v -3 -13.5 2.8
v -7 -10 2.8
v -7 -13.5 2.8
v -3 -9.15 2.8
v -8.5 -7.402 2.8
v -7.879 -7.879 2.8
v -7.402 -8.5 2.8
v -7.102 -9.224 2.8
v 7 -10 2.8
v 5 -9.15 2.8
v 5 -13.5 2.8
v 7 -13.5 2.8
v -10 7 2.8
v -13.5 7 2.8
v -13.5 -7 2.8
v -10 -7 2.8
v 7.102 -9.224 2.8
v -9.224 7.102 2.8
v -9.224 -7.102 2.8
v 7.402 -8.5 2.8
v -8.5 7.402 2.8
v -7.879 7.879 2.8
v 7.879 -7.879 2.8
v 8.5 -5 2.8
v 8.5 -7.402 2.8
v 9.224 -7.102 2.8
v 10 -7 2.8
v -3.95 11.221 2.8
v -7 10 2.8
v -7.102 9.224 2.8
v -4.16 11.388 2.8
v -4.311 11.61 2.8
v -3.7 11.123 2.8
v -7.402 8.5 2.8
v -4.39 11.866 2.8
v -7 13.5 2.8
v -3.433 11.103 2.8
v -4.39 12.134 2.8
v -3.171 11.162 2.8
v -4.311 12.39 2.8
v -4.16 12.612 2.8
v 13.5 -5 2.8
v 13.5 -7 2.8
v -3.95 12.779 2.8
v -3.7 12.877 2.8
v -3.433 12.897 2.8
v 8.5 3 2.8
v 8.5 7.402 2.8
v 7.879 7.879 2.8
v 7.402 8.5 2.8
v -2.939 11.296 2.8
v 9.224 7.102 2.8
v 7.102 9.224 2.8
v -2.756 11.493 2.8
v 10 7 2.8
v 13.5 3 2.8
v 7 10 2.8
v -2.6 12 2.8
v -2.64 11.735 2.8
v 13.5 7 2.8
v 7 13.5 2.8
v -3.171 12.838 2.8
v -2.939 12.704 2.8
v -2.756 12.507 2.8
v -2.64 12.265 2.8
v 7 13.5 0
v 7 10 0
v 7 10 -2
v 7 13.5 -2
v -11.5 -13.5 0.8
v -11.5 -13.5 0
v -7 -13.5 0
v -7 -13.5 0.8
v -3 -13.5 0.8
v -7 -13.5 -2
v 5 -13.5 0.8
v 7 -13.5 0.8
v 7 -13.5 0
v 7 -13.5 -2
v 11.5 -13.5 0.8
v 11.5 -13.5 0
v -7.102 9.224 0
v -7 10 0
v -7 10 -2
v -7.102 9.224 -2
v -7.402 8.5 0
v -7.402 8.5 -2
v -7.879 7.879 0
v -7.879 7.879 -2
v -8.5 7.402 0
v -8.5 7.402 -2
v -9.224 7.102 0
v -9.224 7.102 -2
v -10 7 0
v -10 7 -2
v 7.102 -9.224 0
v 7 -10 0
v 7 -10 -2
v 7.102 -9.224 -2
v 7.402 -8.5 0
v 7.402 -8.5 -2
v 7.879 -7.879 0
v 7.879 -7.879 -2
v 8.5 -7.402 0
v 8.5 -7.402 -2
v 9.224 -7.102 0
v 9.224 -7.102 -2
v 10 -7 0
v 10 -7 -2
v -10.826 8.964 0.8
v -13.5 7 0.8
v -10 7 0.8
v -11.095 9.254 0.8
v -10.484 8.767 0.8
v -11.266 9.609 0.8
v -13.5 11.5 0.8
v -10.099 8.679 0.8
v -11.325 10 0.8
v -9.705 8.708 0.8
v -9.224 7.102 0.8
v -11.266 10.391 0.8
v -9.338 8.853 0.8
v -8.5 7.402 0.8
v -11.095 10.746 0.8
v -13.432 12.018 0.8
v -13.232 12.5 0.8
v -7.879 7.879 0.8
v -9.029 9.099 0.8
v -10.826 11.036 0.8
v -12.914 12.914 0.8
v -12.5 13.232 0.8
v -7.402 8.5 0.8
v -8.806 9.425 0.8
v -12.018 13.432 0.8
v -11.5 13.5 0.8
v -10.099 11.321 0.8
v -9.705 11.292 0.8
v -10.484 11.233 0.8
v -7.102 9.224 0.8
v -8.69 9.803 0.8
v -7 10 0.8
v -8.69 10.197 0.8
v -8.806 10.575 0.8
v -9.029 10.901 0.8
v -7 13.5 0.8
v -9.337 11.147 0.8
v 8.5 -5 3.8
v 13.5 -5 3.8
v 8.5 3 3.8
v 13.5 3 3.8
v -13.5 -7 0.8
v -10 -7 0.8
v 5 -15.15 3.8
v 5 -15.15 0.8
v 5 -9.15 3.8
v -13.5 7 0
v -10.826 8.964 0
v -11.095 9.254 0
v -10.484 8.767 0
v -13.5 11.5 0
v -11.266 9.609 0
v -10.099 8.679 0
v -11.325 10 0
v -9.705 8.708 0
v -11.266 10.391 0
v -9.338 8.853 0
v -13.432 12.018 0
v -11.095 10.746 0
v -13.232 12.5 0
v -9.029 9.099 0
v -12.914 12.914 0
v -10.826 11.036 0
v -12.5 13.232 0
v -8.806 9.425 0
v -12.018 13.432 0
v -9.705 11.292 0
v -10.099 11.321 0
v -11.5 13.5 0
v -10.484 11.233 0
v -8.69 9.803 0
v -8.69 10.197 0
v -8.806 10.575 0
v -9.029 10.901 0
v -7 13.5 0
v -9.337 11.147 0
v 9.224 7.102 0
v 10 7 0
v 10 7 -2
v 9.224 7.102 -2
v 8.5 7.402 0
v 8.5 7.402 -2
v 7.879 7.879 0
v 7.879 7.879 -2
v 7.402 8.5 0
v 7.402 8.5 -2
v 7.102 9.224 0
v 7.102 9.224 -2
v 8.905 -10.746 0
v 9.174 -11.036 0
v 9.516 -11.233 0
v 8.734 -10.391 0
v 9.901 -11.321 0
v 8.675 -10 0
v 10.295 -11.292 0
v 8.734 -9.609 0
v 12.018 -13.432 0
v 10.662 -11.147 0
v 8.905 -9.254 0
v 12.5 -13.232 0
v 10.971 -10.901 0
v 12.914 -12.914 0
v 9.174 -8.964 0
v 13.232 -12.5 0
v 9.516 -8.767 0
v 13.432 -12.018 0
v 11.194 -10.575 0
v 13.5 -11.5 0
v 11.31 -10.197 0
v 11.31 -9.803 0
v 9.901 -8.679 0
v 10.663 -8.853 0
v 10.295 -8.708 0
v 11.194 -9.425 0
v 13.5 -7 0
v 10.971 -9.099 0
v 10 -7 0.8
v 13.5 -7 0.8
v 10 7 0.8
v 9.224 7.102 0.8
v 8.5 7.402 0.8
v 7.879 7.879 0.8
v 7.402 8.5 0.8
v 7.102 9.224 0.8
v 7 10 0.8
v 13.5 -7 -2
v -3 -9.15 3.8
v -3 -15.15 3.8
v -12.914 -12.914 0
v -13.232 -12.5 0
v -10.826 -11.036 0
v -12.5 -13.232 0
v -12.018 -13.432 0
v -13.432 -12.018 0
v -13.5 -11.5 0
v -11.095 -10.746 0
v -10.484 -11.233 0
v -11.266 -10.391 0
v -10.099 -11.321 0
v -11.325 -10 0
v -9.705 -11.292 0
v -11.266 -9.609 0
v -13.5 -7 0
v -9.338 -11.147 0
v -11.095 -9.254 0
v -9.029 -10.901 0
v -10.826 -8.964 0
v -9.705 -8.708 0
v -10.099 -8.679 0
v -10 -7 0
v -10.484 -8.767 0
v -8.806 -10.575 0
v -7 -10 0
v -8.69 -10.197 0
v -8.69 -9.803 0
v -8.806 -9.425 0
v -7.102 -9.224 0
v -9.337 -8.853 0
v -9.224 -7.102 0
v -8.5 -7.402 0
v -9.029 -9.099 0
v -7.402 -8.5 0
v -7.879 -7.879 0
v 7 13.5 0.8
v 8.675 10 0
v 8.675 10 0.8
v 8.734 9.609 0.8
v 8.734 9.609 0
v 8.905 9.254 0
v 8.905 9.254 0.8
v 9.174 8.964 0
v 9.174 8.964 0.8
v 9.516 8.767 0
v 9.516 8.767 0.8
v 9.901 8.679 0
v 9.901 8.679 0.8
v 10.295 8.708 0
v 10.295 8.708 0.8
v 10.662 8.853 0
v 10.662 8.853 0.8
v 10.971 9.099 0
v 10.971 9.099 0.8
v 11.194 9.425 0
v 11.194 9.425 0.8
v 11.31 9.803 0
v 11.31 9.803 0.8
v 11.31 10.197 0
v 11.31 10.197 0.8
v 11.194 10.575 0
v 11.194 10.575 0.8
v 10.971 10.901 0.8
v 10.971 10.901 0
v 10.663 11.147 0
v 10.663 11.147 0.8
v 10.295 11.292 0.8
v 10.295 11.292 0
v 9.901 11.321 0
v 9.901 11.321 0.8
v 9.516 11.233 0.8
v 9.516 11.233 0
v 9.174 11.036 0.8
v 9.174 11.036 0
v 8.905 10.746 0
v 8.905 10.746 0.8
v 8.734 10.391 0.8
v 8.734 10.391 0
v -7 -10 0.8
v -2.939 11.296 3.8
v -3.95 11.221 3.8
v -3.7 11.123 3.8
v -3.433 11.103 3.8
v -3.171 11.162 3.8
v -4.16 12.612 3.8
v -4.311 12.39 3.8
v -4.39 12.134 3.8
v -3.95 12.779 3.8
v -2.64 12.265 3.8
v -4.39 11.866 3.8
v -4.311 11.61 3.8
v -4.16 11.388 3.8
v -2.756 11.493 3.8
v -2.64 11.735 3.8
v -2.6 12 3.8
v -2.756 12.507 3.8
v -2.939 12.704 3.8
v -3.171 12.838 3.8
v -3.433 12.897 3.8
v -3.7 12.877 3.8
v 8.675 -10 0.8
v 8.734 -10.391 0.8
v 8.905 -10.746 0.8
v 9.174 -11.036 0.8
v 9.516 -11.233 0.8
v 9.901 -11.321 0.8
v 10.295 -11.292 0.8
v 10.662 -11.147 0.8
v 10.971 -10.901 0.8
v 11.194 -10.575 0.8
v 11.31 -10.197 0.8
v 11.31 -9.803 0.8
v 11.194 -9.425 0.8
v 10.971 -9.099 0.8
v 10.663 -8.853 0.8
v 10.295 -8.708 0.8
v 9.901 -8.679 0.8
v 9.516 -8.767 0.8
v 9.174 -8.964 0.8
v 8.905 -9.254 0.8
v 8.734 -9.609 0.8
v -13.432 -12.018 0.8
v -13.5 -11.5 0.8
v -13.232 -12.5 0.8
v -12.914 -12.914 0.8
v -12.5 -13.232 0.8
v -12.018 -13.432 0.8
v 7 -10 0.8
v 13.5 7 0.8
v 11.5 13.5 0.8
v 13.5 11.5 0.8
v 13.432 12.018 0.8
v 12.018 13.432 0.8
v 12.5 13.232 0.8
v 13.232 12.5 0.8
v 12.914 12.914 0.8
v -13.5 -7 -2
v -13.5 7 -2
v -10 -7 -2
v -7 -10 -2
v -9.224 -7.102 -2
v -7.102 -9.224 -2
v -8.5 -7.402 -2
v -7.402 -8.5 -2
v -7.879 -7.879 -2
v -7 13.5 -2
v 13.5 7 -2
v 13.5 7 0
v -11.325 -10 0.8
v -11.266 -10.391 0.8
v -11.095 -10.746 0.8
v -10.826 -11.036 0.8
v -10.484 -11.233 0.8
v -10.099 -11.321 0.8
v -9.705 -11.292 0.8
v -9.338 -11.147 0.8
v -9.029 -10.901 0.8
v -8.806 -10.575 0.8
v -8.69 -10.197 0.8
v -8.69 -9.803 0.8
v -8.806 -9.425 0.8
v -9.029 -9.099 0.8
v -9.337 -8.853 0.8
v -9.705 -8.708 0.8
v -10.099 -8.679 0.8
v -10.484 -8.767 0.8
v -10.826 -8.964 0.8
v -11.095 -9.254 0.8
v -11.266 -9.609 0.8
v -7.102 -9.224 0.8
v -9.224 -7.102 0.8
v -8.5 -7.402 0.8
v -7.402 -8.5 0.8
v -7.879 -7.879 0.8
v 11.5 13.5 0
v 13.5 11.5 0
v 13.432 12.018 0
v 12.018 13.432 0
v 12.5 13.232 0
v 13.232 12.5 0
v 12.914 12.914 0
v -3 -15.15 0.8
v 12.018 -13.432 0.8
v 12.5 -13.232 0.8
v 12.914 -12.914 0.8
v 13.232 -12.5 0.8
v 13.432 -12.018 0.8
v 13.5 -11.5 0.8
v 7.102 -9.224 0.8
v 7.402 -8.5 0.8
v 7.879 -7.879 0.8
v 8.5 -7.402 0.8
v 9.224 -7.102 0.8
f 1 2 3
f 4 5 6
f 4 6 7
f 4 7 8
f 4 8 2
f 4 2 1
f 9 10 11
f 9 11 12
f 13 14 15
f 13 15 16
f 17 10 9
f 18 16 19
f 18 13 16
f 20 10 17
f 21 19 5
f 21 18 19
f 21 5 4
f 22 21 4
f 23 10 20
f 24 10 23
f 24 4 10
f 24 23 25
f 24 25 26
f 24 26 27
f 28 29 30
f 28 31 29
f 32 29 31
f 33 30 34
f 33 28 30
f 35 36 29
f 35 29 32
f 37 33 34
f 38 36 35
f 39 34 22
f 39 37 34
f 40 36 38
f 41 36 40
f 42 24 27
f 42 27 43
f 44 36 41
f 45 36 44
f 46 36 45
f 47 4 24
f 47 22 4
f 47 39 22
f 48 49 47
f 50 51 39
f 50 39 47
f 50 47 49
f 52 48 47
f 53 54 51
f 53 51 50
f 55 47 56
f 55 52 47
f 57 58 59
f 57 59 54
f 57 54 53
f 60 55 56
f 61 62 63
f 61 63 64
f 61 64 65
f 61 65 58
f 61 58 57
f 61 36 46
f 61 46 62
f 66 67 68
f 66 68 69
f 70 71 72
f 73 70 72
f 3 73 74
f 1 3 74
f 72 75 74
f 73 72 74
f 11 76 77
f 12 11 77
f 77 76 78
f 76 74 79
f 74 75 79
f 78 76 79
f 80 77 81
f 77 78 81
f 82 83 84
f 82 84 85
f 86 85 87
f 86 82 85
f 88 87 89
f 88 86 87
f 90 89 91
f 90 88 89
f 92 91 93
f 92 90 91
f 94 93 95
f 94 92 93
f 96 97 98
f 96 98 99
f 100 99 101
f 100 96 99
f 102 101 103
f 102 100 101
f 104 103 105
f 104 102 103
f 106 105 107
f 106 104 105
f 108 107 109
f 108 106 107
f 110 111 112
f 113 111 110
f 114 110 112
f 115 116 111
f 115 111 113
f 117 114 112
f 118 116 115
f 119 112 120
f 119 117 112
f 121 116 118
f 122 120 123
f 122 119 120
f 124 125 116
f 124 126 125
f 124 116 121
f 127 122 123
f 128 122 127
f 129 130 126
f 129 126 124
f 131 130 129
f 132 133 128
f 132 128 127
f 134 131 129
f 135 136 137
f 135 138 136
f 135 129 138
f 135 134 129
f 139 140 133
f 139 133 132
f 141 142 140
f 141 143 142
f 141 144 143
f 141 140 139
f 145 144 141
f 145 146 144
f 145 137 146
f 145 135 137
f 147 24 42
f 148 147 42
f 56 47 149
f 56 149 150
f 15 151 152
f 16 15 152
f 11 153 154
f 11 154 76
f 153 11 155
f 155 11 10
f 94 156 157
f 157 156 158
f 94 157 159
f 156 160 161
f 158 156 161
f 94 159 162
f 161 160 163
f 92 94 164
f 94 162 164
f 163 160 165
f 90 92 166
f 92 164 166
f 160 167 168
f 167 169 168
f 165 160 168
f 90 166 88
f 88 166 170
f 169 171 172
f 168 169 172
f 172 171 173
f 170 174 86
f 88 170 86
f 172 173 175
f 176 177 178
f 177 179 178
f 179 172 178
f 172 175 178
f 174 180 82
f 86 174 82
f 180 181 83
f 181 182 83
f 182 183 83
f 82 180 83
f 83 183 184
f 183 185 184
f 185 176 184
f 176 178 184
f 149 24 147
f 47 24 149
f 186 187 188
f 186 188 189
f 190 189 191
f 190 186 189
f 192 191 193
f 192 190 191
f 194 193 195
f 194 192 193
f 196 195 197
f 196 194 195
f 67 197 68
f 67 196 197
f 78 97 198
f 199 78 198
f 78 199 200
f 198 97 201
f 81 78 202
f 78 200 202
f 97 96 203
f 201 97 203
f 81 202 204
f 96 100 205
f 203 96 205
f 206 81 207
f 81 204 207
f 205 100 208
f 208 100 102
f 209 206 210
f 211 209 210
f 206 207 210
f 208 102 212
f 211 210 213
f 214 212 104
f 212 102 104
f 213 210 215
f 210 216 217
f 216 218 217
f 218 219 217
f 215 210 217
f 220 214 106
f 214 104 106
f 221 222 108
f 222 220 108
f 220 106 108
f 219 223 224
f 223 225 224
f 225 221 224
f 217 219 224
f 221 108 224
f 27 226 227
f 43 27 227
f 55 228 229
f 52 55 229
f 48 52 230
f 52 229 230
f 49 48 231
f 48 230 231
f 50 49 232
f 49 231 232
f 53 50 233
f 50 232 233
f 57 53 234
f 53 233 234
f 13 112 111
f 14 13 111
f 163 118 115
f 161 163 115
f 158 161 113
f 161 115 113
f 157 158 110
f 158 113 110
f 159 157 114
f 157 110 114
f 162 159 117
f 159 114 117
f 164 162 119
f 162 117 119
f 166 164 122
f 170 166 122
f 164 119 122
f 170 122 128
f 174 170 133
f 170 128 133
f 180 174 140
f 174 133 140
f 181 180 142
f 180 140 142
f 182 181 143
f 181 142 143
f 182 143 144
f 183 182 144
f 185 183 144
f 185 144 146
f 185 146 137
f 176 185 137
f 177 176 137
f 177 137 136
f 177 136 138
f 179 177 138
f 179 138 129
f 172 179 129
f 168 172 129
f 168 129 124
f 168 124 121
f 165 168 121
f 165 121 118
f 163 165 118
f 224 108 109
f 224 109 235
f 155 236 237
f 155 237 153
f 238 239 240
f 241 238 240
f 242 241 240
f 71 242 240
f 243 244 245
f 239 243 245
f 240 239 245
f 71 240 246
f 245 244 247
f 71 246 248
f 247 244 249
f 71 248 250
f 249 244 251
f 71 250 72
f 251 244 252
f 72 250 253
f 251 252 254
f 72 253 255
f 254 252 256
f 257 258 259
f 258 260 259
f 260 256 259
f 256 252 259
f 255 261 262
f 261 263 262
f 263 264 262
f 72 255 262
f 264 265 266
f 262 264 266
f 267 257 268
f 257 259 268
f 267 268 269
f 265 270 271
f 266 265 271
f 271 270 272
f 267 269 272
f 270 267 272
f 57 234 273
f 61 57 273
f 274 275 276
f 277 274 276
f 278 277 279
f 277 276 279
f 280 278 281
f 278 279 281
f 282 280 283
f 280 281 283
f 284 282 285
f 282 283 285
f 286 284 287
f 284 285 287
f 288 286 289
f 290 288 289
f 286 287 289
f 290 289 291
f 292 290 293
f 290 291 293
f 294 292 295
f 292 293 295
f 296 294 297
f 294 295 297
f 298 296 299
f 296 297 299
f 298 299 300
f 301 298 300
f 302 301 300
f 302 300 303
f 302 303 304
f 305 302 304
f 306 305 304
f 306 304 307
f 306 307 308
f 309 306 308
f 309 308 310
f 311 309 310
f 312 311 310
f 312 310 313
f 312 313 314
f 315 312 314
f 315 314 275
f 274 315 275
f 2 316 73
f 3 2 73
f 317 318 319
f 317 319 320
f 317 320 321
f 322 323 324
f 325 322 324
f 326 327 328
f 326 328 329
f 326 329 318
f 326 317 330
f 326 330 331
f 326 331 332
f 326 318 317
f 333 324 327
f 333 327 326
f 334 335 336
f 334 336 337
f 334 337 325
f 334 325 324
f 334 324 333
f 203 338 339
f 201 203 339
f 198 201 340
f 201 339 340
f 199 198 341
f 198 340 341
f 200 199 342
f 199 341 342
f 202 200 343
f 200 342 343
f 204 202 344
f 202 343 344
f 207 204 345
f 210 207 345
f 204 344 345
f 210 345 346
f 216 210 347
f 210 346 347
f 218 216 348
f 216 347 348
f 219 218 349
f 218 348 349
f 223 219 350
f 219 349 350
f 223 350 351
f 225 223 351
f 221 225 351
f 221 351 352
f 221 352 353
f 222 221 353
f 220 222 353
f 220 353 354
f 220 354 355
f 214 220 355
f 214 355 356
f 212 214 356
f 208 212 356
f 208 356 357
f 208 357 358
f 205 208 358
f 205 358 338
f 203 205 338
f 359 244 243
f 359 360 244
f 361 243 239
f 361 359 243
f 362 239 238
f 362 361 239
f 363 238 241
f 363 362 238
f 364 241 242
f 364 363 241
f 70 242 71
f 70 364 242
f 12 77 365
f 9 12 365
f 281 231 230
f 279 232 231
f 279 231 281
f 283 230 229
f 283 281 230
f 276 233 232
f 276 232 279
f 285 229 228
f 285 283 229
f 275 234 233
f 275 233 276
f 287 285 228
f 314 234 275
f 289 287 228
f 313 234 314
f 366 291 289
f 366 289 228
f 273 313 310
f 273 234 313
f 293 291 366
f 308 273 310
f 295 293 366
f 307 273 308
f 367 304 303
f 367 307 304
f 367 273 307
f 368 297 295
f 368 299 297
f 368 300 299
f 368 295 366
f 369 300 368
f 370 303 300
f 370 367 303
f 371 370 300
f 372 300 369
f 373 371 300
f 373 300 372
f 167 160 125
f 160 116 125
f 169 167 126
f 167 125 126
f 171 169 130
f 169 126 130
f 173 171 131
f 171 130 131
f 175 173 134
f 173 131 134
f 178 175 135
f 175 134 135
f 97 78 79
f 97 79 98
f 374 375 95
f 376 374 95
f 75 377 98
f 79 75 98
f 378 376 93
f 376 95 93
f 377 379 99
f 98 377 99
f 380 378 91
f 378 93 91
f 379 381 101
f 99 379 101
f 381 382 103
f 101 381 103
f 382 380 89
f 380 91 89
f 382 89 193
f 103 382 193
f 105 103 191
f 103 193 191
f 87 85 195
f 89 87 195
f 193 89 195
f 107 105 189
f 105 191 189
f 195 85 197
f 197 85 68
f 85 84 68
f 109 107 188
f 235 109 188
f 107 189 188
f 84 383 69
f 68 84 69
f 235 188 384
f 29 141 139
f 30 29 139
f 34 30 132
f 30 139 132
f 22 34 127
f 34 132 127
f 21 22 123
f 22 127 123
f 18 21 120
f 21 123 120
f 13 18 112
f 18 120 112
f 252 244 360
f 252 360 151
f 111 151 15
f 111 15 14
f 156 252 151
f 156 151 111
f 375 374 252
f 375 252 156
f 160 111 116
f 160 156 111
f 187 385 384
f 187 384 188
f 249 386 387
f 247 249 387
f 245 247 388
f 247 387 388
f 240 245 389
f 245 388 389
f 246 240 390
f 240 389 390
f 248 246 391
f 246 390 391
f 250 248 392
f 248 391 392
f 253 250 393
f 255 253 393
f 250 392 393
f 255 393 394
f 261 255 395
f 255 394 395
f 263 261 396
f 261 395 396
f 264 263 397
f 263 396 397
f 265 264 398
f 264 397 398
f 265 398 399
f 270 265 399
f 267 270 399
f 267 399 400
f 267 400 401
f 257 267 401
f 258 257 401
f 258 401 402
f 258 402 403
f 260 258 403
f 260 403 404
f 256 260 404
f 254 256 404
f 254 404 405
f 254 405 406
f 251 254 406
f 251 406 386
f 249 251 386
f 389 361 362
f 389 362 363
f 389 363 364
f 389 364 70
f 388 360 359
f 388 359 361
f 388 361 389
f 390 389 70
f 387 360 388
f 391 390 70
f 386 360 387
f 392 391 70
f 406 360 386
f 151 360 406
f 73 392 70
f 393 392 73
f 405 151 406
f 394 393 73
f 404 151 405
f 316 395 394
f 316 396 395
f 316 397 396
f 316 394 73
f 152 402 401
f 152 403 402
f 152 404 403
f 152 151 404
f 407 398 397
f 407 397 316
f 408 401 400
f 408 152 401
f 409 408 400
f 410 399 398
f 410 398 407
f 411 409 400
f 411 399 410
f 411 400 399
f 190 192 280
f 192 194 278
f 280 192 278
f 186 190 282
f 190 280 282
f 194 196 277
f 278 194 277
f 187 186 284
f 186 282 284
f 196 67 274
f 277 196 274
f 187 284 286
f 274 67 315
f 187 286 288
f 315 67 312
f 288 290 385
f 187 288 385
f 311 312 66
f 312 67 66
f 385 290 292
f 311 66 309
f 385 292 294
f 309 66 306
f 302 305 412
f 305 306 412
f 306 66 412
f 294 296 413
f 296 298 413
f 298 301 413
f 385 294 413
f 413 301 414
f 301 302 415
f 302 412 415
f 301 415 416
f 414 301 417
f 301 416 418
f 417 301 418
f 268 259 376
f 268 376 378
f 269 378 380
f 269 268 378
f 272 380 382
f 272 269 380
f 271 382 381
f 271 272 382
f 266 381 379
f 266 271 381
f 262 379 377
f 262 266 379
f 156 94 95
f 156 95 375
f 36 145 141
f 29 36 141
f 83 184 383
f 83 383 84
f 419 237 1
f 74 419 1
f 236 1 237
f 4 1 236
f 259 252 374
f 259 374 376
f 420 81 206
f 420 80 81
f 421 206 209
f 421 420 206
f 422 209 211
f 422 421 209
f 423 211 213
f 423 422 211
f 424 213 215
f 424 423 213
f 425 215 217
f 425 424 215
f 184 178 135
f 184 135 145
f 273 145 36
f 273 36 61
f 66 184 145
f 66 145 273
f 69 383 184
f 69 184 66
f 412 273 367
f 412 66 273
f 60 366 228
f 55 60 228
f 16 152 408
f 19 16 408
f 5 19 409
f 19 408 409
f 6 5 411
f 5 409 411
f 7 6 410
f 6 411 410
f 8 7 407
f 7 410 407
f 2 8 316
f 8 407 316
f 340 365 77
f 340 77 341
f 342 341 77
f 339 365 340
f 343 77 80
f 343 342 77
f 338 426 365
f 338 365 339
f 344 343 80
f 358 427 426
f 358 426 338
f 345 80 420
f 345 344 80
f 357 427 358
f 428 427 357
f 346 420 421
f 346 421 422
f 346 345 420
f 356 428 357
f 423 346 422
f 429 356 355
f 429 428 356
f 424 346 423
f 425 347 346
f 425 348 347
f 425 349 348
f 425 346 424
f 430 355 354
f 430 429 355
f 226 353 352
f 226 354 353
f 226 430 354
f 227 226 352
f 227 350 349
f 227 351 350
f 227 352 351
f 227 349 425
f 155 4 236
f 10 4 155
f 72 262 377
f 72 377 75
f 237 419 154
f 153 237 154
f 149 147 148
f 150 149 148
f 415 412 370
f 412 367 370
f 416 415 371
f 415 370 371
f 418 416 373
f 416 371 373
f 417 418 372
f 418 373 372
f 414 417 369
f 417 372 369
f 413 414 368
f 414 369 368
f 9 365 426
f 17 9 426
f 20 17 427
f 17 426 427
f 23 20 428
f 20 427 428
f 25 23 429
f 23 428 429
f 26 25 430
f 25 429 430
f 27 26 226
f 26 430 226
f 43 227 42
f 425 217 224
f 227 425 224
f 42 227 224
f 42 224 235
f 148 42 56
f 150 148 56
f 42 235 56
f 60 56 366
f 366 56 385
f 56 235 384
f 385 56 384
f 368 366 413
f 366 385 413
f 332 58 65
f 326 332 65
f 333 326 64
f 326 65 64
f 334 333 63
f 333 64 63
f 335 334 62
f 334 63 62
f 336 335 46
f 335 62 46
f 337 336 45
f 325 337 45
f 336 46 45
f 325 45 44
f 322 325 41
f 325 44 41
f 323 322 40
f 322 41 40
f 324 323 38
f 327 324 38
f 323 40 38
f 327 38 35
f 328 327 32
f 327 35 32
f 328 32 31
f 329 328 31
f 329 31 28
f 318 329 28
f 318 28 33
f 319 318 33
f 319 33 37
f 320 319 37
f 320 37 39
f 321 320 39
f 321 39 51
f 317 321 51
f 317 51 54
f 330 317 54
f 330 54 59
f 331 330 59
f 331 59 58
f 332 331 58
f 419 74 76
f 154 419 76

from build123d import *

# Parameters (mm, degrees)
F0_W          = 27
F0_H          = 27
F1_DEPTH      = 0.8
F2_D          = 2.65
F3_R          = 2
F4_W          = 5
F4_H          = 8
F4_W_2        = 8
F4_H_2        = 6
F4_R          = 0.9
F5_DEPTH      = 3
F7_DEPTH      = 2.8
F7_DEPTH_BACK = 2


with BuildPart() as f1:
    # F0 (on Top) → F1 (new body)
    with BuildSketch(Plane.XY):
        Rectangle(F0_W, F0_H)
    extrude(amount=F1_DEPTH)

    # F2 (through all)
    with Locations(Plane(origin=(0, 0, 0), x_dir=(1, 0, 0), z_dir=(0, 0, -1))):
        with Locations((-10, 10), (-10, -10), (10, 10), (10, -10)):
            Hole(F2_D / 2)

    # F3
    f3_edges = [f1.edges().sort_by_distance(p)[0] for p in [
        (-13.5, -13.5, 0.4),
        (-13.5, 13.5, 0.4),
        (13.5, -13.5, 0.4),
        (13.5, 13.5, 0.4),
    ]]
    fillet(f3_edges, radius=F3_R)

    # F4 (on face) → F5 (join)
    with BuildSketch(Plane.XY.offset(0.8)):
        with Locations((11, -1)):
            Rectangle(F4_W, F4_H)
        with Locations((1, -12.15)):
            Rectangle(F4_W_2, F4_H_2)
        with Locations((-3.5, 12)):
            Circle(F4_R)
    extrude(amount=F5_DEPTH)

    # F6 (on Top) → F7 (join, two sides)
    with BuildSketch(Plane.XY) as f7_sk:
        with BuildLine():
            Line((7, 10), (7, 13.5))
            Line((7, 13.5), (-7, 13.5))
            Line((-7, 13.5), (-7, 10))
            ThreePointArc((-7, 10), (-7.87868, 7.87868), (-10, 7))
            Line((-10, 7), (-13.5, 7))
            Line((-13.5, 7), (-13.5, -7))
            Line((-13.5, -7), (-10, -7))
            ThreePointArc((-10, -7), (-7.87868, -7.87868), (-7, -10))
            Line((-7, -10), (-7, -13.5))
            Line((-7, -13.5), (7, -13.5))
            Line((7, -13.5), (7, -10))
            ThreePointArc((7, -10), (7.87868, -7.87868), (10, -7))
            Line((10, -7), (13.5, -7))
            Line((13.5, -7), (13.5, 7))
            Line((13.5, 7), (10, 7))
            ThreePointArc((10, 7), (7.87868, 7.87868), (7, 10))
        make_face()
    extrude(amount=F7_DEPTH)
    extrude(f7_sk.sketch, amount=-F7_DEPTH_BACK)


solid = f1.part
